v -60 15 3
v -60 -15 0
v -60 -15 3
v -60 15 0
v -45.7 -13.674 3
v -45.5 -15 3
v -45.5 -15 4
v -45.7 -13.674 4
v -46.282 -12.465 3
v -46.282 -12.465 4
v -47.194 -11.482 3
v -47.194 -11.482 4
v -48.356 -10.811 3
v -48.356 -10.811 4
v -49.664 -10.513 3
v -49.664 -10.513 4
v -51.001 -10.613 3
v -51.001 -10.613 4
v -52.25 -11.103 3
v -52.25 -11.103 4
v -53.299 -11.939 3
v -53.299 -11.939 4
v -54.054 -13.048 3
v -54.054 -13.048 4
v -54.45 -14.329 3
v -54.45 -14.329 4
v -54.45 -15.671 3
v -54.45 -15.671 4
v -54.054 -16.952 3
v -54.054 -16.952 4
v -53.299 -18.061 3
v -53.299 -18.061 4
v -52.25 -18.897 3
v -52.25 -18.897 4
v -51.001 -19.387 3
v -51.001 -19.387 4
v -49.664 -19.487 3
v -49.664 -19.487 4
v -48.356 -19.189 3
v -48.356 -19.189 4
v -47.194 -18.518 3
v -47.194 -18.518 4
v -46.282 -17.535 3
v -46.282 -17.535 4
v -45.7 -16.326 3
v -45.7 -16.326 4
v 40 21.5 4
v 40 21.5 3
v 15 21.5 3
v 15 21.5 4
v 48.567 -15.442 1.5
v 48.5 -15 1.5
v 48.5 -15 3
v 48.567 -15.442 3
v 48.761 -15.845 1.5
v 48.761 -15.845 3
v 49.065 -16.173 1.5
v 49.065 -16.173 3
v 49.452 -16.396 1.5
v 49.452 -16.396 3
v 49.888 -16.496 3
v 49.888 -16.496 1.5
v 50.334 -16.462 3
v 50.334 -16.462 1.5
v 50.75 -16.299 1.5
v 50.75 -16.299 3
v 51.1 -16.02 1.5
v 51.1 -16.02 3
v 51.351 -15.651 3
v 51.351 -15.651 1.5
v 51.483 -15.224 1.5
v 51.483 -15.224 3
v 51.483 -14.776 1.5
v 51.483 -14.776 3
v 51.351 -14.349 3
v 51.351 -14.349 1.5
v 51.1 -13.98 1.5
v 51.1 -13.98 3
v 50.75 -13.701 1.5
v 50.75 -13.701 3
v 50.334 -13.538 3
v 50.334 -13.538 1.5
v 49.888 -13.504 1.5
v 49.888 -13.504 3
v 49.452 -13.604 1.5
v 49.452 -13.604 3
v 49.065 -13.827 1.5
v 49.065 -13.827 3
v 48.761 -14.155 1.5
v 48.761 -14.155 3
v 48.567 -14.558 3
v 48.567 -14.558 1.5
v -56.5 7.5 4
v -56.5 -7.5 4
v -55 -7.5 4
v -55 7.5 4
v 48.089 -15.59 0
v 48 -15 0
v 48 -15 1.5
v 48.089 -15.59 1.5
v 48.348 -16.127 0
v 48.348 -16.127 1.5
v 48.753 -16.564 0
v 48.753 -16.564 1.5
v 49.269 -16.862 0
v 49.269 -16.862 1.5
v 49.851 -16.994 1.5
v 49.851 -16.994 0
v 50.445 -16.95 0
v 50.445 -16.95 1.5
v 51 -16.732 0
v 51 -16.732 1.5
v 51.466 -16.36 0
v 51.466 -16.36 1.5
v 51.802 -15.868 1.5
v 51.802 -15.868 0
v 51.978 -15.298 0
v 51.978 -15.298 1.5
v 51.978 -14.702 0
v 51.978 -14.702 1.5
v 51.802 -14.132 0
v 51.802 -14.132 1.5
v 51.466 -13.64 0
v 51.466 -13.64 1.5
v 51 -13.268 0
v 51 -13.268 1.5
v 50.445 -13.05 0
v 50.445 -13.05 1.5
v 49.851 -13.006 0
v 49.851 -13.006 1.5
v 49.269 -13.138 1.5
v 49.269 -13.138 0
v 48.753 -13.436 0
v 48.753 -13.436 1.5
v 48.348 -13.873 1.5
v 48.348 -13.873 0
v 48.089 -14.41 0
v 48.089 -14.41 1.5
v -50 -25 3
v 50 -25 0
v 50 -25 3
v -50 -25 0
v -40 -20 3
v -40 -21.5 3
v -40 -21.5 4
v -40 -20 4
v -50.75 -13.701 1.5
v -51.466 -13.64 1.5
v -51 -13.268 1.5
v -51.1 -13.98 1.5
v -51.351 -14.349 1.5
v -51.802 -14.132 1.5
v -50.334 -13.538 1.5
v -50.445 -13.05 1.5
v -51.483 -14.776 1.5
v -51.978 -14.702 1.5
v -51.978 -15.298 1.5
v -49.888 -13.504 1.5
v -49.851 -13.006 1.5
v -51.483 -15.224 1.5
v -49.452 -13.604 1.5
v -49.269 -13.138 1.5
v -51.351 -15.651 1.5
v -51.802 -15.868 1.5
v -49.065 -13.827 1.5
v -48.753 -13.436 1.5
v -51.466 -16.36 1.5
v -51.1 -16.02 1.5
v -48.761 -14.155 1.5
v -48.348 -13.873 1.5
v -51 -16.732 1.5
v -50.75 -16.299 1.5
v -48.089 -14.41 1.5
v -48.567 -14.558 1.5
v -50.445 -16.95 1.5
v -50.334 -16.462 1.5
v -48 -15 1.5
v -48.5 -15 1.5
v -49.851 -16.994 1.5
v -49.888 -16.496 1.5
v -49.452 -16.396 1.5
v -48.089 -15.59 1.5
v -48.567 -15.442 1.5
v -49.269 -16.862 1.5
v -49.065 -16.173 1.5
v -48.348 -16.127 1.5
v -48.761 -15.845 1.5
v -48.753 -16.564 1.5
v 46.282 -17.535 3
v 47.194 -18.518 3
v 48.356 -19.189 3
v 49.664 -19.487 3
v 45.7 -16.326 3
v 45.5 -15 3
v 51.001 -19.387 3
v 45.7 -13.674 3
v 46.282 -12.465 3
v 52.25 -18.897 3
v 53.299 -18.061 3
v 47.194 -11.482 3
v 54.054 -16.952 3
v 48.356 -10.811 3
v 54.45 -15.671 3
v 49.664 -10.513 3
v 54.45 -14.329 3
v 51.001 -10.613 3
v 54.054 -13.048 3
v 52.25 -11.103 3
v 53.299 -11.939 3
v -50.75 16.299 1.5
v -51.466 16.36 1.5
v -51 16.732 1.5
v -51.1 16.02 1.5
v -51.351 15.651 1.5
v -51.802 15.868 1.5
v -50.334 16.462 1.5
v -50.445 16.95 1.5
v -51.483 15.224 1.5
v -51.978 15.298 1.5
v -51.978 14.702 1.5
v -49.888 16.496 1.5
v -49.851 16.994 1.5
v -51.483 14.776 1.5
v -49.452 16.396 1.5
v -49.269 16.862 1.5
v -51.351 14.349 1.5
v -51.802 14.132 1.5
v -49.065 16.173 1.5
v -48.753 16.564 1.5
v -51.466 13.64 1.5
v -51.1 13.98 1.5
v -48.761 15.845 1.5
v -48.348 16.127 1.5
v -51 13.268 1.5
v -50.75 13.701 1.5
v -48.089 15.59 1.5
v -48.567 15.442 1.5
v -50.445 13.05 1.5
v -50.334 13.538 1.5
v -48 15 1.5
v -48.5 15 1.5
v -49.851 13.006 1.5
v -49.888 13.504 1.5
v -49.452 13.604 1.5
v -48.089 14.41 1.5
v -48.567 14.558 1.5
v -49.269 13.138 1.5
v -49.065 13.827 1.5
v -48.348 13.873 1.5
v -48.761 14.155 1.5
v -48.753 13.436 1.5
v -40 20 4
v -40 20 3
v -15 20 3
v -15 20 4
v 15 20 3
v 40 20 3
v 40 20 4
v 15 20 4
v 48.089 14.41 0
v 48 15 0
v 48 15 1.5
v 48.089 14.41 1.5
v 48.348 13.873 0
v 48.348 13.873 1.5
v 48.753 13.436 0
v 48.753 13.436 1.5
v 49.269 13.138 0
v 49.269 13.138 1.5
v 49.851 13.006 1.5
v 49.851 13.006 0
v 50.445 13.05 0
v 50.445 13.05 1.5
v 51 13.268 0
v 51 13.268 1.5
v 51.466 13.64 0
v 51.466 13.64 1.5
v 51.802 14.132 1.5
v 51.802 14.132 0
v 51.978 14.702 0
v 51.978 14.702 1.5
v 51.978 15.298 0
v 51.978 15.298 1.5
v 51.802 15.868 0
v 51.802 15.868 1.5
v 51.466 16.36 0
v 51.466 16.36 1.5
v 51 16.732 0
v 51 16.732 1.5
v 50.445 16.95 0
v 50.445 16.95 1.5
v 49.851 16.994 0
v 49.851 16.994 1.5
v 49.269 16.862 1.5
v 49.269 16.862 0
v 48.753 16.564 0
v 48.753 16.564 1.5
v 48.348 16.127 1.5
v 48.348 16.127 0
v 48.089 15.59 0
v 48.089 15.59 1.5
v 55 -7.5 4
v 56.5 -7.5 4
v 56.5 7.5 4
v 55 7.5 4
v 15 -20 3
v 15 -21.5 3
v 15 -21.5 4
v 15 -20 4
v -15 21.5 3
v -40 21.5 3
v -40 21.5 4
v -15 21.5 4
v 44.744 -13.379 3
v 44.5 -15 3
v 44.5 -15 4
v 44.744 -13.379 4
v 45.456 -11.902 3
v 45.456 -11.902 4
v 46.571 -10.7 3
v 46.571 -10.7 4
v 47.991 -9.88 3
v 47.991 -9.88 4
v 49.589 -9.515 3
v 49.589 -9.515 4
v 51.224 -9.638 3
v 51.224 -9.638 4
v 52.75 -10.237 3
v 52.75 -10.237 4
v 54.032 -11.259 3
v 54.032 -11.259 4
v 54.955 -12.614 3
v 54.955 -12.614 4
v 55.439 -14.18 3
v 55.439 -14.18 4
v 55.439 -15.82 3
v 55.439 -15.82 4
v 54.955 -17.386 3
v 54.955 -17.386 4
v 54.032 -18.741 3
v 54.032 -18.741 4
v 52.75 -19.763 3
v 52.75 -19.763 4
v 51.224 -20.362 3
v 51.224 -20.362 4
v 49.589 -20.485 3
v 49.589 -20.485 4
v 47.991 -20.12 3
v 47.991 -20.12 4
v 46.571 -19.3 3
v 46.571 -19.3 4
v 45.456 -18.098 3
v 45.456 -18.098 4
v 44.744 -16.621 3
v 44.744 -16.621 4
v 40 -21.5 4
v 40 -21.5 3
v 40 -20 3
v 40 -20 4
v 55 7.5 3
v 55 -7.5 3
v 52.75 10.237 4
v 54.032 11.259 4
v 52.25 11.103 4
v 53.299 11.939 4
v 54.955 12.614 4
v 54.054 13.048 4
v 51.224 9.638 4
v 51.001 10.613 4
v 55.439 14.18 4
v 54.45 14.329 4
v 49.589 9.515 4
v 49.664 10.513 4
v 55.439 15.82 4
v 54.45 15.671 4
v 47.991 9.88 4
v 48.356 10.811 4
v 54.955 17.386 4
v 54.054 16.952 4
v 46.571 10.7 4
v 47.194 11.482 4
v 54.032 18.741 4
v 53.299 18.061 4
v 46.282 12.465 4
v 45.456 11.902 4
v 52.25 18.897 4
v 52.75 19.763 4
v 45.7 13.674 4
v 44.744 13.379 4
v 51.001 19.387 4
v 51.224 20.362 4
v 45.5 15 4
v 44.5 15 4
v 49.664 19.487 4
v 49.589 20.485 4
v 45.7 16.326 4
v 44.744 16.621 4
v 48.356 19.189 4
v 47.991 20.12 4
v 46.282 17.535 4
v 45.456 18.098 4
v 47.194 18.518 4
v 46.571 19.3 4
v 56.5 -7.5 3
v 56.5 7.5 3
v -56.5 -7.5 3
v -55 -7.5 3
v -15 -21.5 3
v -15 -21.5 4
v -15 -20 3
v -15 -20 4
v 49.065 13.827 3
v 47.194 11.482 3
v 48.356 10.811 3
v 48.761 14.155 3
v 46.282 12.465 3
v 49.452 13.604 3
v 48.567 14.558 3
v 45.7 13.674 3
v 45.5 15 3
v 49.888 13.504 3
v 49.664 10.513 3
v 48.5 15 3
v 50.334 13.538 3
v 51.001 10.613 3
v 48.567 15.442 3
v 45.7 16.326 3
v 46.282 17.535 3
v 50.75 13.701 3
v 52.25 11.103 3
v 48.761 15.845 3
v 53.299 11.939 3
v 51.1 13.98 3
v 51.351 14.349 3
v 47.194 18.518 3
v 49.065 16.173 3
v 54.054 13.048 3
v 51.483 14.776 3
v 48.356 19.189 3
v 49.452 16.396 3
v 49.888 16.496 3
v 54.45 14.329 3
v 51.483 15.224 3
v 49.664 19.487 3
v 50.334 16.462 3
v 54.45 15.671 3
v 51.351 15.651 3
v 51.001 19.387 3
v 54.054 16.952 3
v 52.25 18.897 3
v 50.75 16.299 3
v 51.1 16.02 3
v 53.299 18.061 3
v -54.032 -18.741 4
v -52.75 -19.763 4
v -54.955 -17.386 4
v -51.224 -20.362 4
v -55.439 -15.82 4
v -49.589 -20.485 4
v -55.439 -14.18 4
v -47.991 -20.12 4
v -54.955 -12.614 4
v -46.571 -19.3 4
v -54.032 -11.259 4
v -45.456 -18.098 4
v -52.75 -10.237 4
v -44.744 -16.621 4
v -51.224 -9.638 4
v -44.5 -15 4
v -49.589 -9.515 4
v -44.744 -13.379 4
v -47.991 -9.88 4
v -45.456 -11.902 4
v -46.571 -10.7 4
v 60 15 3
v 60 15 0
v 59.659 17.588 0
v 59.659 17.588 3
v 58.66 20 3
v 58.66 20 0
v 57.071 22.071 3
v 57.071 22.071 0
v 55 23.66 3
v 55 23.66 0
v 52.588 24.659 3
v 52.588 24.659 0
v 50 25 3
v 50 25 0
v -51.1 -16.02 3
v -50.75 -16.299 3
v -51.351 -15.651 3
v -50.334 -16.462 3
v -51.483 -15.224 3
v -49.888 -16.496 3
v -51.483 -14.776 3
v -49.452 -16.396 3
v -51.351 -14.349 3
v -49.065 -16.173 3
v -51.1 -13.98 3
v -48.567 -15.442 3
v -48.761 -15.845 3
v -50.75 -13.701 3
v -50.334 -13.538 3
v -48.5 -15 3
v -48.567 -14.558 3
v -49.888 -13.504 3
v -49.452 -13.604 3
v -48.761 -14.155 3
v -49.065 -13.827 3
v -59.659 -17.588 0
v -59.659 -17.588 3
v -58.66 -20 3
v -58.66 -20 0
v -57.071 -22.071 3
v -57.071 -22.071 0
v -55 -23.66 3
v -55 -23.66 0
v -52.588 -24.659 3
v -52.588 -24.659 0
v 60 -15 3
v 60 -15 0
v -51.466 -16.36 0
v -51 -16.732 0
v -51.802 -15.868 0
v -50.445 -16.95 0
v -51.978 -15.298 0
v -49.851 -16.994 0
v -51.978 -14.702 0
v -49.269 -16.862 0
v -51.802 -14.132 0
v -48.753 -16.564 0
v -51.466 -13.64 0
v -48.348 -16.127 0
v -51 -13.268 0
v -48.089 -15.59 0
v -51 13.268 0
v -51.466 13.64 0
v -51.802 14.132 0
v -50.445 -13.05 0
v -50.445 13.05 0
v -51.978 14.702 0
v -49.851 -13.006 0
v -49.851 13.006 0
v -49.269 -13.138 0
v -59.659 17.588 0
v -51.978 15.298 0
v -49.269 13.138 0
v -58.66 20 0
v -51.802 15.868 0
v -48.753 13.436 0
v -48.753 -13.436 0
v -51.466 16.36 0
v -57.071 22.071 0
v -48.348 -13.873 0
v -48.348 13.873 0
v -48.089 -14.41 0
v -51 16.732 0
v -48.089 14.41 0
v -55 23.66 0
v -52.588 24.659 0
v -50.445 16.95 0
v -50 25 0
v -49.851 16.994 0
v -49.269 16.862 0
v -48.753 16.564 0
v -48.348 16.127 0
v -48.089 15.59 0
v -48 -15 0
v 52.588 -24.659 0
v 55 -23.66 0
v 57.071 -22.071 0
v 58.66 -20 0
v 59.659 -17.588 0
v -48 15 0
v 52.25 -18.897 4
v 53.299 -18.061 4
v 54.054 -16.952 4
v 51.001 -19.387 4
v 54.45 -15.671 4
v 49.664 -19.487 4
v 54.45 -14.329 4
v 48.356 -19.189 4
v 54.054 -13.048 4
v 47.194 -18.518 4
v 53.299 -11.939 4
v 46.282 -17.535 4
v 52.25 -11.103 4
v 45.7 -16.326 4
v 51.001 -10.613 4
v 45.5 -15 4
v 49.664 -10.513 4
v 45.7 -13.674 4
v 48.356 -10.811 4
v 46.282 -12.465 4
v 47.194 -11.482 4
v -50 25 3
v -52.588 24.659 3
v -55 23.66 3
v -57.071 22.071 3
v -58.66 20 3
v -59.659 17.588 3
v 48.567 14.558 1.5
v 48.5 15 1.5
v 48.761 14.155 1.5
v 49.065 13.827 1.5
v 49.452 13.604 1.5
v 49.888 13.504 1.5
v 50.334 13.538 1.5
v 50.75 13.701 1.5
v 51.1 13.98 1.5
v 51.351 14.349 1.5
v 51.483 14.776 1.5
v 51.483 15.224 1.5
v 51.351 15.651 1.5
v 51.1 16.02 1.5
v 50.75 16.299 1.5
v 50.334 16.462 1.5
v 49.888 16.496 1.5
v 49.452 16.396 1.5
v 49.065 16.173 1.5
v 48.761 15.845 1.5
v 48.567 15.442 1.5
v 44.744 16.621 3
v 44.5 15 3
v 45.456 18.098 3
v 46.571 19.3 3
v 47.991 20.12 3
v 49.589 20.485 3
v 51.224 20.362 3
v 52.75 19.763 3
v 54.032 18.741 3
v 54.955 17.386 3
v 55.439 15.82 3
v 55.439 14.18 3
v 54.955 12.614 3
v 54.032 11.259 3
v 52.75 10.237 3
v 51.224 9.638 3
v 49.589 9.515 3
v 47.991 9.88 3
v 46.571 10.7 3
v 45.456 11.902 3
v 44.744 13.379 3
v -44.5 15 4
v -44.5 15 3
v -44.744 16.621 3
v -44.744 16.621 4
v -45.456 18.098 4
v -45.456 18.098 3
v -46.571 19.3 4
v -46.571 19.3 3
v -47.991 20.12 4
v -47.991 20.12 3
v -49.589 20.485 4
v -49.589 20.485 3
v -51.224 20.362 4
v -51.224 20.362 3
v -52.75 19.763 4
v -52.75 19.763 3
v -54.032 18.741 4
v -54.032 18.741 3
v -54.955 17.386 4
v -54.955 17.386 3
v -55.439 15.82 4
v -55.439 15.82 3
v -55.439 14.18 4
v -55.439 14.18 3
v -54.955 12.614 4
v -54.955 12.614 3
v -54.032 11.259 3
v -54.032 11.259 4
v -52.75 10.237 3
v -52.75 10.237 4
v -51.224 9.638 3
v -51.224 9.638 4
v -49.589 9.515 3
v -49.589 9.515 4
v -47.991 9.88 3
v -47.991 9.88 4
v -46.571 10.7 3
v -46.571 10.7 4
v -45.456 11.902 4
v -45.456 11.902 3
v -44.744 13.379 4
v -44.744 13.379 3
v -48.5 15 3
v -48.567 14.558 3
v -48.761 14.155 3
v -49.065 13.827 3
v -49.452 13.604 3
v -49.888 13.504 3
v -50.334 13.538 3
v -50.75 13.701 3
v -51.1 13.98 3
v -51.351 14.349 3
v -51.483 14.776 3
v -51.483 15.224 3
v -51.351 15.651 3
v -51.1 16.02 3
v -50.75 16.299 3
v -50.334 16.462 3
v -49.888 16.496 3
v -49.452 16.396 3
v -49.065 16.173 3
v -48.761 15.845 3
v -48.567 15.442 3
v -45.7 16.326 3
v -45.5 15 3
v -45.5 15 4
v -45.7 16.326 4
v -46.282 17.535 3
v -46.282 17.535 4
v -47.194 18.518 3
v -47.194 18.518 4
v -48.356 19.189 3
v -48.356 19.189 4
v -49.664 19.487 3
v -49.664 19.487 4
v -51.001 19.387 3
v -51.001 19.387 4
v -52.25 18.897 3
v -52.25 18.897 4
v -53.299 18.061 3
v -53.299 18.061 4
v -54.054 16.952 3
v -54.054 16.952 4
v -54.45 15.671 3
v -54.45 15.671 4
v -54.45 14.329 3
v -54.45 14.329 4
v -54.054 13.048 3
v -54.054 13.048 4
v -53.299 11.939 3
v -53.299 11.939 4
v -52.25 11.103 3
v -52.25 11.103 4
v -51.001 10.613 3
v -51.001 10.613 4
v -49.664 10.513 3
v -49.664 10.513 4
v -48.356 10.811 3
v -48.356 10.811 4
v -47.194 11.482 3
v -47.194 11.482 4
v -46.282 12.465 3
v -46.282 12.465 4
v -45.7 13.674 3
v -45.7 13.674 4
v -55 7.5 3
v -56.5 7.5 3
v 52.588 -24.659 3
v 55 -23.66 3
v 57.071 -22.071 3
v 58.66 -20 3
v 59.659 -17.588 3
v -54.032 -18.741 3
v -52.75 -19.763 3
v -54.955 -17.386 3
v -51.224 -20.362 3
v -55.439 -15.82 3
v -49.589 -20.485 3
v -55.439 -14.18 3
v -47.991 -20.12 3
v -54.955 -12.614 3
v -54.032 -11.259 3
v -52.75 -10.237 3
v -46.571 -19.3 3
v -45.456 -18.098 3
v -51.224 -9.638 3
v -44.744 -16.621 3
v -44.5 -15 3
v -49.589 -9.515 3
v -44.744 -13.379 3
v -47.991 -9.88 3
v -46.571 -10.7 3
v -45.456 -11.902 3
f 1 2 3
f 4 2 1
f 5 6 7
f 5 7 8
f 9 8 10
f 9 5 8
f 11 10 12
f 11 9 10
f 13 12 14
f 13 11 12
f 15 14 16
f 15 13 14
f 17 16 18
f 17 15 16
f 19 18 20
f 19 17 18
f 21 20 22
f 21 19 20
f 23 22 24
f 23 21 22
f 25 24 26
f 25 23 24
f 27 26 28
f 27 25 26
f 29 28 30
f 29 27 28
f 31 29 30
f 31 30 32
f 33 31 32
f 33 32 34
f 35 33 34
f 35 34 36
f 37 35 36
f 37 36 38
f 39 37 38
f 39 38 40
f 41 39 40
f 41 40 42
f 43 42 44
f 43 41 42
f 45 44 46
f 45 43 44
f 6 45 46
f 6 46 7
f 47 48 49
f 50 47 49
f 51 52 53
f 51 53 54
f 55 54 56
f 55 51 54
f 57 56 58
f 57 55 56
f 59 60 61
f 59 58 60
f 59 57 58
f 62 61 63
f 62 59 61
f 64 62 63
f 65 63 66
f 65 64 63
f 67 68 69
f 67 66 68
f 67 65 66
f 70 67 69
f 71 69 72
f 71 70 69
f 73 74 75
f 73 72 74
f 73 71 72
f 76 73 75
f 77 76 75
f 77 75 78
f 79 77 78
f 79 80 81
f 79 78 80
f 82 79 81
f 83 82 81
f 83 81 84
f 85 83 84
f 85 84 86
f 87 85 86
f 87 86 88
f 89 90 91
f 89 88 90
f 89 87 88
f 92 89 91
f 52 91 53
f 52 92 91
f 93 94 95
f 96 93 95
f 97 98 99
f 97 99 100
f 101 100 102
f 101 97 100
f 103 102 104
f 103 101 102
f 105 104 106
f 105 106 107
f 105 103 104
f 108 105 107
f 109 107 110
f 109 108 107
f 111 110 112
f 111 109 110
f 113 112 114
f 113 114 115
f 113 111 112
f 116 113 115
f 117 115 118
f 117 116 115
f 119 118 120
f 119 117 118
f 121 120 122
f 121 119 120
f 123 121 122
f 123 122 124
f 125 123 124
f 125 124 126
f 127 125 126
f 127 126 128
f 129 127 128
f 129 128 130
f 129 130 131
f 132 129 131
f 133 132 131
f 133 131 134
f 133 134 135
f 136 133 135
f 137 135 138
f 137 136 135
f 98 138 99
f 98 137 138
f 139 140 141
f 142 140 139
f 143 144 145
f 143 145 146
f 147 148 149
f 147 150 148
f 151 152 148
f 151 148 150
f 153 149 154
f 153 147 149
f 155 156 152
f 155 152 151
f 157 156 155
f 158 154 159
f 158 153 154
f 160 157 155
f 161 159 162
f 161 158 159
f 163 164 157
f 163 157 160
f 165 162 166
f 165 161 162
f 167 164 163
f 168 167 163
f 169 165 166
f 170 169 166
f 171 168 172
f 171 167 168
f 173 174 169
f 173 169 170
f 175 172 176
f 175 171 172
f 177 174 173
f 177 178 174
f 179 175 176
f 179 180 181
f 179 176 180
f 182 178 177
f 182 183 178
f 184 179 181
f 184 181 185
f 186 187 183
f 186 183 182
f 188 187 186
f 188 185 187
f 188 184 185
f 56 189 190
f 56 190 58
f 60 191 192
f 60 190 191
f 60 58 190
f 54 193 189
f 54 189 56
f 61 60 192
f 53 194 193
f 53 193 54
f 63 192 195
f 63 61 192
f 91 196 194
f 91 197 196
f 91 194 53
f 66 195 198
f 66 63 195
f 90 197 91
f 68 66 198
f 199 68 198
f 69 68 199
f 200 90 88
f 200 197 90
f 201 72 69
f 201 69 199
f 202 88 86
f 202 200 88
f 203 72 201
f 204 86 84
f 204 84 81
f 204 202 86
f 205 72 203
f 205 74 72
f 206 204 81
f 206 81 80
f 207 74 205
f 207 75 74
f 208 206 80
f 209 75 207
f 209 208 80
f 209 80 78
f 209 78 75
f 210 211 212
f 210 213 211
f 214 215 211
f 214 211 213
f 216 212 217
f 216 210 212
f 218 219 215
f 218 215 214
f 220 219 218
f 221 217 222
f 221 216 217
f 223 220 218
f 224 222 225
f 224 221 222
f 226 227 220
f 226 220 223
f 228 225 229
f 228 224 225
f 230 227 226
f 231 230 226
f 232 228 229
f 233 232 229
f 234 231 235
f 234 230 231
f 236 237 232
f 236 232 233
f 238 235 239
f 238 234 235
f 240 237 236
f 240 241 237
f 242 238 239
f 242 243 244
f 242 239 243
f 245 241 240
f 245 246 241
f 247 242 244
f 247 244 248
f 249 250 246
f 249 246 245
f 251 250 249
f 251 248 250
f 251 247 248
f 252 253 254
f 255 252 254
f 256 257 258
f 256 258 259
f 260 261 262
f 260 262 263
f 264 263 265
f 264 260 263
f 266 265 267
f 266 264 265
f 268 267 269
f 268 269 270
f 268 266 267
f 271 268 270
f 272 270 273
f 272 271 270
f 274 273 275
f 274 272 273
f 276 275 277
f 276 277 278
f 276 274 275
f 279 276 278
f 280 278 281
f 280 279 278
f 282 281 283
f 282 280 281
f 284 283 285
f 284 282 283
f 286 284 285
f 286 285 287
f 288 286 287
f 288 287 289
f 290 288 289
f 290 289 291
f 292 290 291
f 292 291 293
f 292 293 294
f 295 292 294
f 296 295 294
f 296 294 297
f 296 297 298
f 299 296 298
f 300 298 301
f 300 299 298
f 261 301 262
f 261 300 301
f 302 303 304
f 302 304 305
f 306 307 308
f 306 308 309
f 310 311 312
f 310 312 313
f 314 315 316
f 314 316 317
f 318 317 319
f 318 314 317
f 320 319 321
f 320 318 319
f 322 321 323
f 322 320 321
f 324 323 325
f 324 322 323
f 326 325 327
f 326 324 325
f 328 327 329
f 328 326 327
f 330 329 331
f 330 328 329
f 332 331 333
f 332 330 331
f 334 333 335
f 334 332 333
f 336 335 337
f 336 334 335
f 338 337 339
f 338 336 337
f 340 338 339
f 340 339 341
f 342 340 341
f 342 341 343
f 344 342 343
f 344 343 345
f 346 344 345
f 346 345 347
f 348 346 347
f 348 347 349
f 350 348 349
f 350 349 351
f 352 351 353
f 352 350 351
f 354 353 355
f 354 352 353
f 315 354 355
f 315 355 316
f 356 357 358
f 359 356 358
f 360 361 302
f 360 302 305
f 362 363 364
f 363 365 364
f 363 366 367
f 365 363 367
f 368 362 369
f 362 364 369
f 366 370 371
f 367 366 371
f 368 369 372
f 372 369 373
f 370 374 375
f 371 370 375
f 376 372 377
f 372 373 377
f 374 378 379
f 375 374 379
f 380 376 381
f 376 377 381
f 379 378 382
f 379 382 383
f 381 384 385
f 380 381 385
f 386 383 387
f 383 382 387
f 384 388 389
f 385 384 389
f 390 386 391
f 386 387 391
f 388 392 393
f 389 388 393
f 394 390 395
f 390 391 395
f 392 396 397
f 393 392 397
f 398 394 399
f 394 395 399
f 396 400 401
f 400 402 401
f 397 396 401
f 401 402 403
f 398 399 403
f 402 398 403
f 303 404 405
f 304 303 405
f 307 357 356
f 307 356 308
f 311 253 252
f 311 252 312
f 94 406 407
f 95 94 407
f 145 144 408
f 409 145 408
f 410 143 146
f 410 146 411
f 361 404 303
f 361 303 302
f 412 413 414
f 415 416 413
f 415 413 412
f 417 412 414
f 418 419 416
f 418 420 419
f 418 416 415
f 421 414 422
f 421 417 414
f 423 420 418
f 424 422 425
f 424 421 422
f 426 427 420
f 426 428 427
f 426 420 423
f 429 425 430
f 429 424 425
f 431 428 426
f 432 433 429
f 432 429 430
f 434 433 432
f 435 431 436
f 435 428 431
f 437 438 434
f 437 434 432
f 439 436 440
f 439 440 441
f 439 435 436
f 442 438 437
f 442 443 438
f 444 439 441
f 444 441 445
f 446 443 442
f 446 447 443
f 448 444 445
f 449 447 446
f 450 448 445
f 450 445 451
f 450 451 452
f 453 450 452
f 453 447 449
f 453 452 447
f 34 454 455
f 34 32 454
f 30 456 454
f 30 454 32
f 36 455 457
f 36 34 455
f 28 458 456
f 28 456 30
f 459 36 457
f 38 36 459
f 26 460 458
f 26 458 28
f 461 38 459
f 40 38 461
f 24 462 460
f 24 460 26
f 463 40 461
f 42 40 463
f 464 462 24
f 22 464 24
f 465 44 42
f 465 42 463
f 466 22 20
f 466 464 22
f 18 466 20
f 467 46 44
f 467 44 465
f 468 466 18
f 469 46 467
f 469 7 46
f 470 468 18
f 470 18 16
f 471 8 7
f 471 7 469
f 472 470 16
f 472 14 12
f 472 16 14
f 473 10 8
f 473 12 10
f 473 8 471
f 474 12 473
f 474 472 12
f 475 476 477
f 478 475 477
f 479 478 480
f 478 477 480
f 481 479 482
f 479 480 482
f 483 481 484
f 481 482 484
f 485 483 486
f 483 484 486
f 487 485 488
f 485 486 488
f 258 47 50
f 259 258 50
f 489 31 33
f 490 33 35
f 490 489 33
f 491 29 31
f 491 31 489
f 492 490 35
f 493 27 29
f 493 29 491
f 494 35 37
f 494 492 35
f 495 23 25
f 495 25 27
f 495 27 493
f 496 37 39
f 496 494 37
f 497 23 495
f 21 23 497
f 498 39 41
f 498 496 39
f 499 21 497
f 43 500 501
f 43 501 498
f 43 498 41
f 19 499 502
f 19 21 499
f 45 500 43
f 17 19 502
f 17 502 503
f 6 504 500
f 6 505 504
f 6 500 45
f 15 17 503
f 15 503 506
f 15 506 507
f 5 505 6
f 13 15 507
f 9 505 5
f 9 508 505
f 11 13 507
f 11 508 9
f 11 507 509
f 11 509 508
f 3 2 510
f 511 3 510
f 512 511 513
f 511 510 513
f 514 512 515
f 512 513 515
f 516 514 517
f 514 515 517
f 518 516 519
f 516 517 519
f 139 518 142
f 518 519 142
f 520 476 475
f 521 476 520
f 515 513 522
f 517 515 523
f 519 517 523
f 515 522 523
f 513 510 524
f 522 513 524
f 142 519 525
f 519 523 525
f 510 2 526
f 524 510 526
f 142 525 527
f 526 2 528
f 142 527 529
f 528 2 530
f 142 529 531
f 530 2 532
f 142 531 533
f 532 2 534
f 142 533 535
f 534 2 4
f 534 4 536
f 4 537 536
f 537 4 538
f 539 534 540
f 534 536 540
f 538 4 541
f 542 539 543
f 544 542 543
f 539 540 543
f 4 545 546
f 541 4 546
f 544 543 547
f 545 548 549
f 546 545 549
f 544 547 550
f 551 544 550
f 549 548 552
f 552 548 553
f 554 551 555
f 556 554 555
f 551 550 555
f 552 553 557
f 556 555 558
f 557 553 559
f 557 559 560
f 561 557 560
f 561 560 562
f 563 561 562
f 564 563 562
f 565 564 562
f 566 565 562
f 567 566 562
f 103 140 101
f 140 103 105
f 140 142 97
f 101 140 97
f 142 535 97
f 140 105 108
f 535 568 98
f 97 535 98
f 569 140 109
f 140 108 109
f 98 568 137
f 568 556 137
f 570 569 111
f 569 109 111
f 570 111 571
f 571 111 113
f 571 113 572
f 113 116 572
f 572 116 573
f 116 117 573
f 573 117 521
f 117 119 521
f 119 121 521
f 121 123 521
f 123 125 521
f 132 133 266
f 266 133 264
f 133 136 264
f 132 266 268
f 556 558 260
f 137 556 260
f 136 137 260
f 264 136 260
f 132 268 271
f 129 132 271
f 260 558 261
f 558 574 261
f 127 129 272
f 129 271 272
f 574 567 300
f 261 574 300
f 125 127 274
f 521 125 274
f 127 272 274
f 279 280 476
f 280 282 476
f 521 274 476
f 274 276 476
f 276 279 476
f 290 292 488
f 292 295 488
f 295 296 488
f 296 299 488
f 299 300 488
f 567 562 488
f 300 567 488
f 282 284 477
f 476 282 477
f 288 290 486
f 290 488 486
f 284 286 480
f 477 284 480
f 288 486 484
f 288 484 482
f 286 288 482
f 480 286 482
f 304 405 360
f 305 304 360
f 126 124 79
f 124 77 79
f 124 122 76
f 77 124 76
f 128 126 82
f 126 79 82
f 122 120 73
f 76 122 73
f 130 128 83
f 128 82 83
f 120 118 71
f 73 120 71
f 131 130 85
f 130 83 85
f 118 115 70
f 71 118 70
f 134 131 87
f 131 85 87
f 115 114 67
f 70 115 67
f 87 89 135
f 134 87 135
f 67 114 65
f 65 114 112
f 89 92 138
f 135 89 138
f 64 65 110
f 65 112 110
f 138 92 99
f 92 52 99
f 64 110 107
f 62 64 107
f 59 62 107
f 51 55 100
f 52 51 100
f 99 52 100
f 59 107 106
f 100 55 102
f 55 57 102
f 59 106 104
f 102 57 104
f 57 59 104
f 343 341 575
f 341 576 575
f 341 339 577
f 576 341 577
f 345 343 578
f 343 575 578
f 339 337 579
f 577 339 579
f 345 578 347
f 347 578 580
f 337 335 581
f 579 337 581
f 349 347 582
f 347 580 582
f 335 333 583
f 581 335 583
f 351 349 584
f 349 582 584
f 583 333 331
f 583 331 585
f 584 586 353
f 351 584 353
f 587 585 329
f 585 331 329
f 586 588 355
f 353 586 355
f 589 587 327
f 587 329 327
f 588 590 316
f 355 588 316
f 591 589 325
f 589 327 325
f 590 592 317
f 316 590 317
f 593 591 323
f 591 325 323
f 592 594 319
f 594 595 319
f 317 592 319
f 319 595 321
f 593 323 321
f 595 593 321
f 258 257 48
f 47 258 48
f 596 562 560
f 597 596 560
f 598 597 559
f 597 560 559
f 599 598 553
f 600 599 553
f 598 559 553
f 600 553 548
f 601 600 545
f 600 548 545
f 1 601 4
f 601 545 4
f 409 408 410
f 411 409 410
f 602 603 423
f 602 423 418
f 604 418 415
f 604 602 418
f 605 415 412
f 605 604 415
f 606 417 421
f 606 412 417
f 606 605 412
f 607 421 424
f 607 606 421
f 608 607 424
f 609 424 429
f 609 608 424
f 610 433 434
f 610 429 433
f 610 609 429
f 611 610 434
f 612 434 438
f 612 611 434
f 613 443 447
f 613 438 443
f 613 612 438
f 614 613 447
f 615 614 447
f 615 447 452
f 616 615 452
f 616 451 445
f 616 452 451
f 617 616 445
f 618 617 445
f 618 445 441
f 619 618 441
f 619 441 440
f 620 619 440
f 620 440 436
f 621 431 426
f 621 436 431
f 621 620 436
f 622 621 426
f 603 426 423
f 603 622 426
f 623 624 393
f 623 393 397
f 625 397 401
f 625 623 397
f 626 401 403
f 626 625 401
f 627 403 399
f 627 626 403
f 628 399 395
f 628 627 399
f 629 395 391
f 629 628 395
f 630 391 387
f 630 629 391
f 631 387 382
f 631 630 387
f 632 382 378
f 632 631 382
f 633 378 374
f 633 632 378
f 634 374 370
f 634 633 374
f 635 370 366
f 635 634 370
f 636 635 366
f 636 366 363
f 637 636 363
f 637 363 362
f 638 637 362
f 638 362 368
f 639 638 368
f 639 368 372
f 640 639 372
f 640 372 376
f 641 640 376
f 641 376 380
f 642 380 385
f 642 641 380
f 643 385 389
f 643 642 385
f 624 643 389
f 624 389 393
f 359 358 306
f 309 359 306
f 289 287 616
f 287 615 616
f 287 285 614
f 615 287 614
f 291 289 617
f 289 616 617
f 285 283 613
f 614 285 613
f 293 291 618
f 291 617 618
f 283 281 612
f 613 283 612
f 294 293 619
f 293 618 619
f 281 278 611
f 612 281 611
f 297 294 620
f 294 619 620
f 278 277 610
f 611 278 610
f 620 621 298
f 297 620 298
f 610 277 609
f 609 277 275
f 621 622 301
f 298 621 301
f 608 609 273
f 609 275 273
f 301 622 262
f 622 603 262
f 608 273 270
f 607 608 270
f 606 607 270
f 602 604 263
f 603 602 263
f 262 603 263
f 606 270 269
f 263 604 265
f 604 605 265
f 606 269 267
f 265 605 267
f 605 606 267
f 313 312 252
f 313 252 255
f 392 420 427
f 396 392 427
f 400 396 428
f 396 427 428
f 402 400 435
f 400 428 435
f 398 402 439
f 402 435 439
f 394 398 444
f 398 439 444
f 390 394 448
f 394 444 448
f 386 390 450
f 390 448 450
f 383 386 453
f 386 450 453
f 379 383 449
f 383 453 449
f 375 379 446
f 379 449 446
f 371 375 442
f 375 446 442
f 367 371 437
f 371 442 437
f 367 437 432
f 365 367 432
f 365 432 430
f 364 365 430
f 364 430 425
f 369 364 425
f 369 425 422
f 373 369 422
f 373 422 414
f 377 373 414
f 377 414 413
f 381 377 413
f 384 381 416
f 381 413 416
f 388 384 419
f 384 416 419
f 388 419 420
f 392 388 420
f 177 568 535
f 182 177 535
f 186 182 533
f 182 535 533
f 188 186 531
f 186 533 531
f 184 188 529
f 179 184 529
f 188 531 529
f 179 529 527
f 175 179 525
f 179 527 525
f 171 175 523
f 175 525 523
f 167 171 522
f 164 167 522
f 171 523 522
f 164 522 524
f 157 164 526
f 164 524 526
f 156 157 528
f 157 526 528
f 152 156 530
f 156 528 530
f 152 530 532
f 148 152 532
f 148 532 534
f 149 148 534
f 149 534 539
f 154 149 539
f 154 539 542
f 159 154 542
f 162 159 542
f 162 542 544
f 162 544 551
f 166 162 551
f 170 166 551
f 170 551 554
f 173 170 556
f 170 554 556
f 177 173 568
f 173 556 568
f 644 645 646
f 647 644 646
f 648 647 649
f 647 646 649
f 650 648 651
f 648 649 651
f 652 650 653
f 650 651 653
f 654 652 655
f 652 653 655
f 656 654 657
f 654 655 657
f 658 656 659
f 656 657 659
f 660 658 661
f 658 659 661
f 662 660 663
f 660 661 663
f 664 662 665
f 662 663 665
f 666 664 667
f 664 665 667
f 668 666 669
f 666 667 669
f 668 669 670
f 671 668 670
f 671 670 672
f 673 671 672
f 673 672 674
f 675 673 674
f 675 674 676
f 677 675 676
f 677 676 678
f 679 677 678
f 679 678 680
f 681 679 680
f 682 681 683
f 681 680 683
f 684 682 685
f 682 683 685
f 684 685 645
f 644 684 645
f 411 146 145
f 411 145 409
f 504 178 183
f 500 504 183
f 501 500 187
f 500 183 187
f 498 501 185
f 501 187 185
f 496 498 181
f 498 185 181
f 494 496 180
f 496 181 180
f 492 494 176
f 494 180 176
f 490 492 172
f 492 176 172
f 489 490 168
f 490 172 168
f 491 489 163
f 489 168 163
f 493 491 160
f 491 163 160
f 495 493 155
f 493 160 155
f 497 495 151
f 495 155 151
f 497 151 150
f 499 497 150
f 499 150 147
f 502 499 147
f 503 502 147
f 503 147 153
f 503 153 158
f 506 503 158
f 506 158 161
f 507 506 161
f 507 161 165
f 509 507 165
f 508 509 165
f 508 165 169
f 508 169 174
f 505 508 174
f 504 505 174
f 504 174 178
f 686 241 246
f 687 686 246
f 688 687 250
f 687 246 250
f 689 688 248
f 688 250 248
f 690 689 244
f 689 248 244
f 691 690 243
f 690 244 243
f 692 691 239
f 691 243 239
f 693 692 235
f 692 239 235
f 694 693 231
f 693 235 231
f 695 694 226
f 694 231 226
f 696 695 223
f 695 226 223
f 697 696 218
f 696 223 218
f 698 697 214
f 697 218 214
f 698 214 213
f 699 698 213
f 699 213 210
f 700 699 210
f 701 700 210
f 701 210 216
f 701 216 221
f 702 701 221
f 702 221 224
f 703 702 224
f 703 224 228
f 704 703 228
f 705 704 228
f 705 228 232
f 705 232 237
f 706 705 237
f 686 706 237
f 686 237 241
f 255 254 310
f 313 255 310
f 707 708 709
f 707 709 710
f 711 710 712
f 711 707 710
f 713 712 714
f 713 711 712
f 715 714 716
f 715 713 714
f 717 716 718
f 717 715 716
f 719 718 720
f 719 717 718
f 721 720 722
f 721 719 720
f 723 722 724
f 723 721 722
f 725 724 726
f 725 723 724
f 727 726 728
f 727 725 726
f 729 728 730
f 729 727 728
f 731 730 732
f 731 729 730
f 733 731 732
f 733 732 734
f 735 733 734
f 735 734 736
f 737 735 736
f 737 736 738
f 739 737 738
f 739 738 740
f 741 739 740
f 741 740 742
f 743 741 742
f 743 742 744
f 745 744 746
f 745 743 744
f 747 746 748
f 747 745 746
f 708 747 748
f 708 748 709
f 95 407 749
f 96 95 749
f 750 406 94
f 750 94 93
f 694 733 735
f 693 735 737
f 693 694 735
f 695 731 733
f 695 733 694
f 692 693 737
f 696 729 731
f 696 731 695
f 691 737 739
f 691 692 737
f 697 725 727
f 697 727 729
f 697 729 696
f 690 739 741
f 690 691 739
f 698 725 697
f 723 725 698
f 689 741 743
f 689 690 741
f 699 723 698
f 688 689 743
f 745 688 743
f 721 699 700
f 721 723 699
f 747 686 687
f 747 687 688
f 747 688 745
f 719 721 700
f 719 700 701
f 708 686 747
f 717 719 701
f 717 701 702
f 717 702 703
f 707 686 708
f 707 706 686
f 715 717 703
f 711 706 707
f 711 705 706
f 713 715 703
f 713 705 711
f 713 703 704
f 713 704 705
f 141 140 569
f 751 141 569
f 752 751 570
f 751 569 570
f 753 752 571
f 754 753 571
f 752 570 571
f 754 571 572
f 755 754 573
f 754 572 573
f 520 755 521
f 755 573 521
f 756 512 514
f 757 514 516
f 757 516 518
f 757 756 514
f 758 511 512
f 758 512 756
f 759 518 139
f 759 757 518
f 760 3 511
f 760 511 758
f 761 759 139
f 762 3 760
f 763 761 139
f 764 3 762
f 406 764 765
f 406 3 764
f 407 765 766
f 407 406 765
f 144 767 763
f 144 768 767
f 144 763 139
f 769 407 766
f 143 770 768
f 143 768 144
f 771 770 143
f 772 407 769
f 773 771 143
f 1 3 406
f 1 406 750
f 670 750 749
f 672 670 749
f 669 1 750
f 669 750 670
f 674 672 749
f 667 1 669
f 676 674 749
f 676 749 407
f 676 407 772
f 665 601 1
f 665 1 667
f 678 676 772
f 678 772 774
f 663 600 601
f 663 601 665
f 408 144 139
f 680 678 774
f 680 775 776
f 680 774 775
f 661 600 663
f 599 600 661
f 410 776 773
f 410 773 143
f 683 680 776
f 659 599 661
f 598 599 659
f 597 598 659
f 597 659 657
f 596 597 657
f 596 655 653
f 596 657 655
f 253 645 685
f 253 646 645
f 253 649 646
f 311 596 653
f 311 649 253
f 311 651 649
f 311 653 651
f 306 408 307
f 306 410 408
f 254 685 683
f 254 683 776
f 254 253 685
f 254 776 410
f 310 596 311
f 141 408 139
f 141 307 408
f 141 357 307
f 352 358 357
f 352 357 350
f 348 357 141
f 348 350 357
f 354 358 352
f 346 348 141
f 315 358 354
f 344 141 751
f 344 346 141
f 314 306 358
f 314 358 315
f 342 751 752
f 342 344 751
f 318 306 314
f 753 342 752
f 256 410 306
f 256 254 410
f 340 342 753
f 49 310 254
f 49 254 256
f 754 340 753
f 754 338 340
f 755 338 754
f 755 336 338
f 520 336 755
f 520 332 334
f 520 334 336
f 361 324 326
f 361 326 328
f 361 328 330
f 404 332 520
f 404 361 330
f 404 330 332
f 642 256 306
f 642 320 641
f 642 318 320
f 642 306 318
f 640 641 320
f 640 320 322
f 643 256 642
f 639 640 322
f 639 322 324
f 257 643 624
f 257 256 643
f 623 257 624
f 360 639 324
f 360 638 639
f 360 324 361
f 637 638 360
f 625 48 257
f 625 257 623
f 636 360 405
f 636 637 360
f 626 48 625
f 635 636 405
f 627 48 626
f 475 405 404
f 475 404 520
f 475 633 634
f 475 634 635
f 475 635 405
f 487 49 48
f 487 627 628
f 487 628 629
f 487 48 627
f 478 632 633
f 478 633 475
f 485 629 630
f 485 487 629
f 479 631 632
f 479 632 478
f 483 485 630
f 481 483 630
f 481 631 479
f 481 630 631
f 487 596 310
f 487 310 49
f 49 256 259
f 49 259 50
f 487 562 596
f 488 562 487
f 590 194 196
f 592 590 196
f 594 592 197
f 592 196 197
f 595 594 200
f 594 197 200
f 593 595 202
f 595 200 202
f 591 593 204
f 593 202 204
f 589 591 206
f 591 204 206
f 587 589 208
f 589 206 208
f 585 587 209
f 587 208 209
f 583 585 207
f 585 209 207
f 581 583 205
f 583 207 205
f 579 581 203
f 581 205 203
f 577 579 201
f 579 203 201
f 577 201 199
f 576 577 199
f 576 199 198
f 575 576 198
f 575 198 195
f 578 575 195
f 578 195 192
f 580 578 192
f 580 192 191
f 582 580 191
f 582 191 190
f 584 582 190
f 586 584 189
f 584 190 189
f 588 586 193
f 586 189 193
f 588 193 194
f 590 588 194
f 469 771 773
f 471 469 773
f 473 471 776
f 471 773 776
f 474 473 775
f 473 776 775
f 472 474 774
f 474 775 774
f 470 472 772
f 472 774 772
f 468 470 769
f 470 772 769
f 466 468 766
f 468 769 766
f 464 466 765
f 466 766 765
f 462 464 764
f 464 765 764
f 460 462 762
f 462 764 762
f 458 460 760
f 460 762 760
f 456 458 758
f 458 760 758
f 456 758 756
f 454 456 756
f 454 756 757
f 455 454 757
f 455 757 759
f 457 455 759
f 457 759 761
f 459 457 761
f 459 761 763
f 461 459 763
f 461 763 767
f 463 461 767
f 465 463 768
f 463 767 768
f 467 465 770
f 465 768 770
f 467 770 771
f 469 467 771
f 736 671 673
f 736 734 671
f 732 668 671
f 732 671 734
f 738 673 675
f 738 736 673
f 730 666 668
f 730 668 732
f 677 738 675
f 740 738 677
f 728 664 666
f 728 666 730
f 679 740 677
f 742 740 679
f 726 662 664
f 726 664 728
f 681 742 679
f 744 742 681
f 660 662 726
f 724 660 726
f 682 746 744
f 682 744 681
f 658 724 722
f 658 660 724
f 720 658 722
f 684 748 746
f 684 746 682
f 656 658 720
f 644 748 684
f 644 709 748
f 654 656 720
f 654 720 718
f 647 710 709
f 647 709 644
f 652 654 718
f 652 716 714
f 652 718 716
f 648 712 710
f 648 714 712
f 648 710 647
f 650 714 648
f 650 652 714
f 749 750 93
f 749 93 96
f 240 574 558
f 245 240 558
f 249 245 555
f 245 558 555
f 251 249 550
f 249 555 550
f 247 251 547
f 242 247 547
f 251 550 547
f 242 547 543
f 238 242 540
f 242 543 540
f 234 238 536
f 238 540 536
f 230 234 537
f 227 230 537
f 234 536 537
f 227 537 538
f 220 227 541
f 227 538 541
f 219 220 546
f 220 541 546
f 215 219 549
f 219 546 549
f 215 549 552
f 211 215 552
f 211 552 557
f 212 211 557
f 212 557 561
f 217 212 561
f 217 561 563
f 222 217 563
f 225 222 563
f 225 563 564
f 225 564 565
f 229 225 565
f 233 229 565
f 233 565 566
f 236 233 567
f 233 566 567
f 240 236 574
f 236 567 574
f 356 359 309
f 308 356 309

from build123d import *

# Parameters (mm, degrees)
PAD_DEPTH       = 3
SKETCH001_R     = 5.5
SKETCH001_R_2   = 4.5
SKETCH001_W     = 25
SKETCH001_H     = 1.5
SKETCH001_W_2   = 1.5
SKETCH001_H_2   = 15
PAD001_DEPTH    = 1
SKETCH002_R     = 1.5
POCKET_DEPTH    = 264.124048
SKETCH003_R     = 2
POCKET001_DEPTH = 1.5


with BuildPart() as part:
    # Sketch → Pad (new body)
    with BuildSketch(Plane.XY):
        with BuildLine():
            ThreePointArc((-50, 25), (-57.071068, 22.071068), (-60, 15))
            Line((-60, -15), (-60, 15))
            ThreePointArc((-60, -15), (-57.071068, -22.071068), (-50, -25))
            Line((50, -25), (-50, -25))
            ThreePointArc((50, -25), (57.071068, -22.071068), (60, -15))
            Line((60, 15), (60, -15))
            ThreePointArc((60, 15), (57.071068, 22.071068), (50, 25))
            Line((-50, 25), (50, 25))
        make_face()
    extrude(amount=PAD_DEPTH)

    # Sketch001 (on Face10 of Pad) → Pad001 (join)
    with BuildSketch(Plane.XY.offset(3)):
        with Locations((-50, 15)):
            Circle(SKETCH001_R)
        with Locations((-50, 15)):
            Circle(SKETCH001_R_2, mode=Mode.SUBTRACT)
        with Locations((-50, -15)):
            Circle(SKETCH001_R)
        with Locations((-50, -15)):
            Circle(SKETCH001_R_2, mode=Mode.SUBTRACT)
        with Locations((-27.5, 20.75)):
            Rectangle(SKETCH001_W, SKETCH001_H)
        with Locations((-27.5, -20.75)):
            Rectangle(SKETCH001_W, SKETCH001_H)
        with Locations((-55.75, 0)):
            Rectangle(SKETCH001_W_2, SKETCH001_H_2)
    pad001 = extrude(amount=PAD001_DEPTH)

    # Sketch002 (on Face4 of Pad001) → Pocket (cut, through all)
    with BuildSketch(Plane(origin=(0, 0, 0), x_dir=(1, 0, 0), z_dir=(0, 0, -1))):
        with Locations((-50, 15)):
            Circle(SKETCH002_R)
        with Locations((-50, -15)):
            Circle(SKETCH002_R)
    pocket = extrude(amount=-POCKET_DEPTH, mode=Mode.SUBTRACT)

    # Sketch003 (on Face4 of Pocket) → Pocket001 (cut)
    with BuildSketch(Plane(origin=(0, 0, 0), x_dir=(1, 0, 0), z_dir=(0, 0, -1))):
        with Locations((-50, 15)):
            Circle(SKETCH003_R)
        with Locations((-50, -15)):
            Circle(SKETCH003_R)
    pocket001 = extrude(amount=-POCKET001_DEPTH, mode=Mode.SUBTRACT)

    # Mirrored: Pad001, Pocket, Pocket001 across Sketch001 V_Axis
    add(pad001.mirror(Plane(origin=(0, 0, 3), x_dir=(0, 0, 1), z_dir=(1, 0, 0))))
    add(pocket.mirror(Plane(origin=(0, 0, 3), x_dir=(0, 0, 1), z_dir=(1, 0, 0))), mode=Mode.SUBTRACT)
    add(pocket001.mirror(Plane(origin=(0, 0, 3), x_dir=(0, 0, 1), z_dir=(1, 0, 0))), mode=Mode.SUBTRACT)


solid = part.part
